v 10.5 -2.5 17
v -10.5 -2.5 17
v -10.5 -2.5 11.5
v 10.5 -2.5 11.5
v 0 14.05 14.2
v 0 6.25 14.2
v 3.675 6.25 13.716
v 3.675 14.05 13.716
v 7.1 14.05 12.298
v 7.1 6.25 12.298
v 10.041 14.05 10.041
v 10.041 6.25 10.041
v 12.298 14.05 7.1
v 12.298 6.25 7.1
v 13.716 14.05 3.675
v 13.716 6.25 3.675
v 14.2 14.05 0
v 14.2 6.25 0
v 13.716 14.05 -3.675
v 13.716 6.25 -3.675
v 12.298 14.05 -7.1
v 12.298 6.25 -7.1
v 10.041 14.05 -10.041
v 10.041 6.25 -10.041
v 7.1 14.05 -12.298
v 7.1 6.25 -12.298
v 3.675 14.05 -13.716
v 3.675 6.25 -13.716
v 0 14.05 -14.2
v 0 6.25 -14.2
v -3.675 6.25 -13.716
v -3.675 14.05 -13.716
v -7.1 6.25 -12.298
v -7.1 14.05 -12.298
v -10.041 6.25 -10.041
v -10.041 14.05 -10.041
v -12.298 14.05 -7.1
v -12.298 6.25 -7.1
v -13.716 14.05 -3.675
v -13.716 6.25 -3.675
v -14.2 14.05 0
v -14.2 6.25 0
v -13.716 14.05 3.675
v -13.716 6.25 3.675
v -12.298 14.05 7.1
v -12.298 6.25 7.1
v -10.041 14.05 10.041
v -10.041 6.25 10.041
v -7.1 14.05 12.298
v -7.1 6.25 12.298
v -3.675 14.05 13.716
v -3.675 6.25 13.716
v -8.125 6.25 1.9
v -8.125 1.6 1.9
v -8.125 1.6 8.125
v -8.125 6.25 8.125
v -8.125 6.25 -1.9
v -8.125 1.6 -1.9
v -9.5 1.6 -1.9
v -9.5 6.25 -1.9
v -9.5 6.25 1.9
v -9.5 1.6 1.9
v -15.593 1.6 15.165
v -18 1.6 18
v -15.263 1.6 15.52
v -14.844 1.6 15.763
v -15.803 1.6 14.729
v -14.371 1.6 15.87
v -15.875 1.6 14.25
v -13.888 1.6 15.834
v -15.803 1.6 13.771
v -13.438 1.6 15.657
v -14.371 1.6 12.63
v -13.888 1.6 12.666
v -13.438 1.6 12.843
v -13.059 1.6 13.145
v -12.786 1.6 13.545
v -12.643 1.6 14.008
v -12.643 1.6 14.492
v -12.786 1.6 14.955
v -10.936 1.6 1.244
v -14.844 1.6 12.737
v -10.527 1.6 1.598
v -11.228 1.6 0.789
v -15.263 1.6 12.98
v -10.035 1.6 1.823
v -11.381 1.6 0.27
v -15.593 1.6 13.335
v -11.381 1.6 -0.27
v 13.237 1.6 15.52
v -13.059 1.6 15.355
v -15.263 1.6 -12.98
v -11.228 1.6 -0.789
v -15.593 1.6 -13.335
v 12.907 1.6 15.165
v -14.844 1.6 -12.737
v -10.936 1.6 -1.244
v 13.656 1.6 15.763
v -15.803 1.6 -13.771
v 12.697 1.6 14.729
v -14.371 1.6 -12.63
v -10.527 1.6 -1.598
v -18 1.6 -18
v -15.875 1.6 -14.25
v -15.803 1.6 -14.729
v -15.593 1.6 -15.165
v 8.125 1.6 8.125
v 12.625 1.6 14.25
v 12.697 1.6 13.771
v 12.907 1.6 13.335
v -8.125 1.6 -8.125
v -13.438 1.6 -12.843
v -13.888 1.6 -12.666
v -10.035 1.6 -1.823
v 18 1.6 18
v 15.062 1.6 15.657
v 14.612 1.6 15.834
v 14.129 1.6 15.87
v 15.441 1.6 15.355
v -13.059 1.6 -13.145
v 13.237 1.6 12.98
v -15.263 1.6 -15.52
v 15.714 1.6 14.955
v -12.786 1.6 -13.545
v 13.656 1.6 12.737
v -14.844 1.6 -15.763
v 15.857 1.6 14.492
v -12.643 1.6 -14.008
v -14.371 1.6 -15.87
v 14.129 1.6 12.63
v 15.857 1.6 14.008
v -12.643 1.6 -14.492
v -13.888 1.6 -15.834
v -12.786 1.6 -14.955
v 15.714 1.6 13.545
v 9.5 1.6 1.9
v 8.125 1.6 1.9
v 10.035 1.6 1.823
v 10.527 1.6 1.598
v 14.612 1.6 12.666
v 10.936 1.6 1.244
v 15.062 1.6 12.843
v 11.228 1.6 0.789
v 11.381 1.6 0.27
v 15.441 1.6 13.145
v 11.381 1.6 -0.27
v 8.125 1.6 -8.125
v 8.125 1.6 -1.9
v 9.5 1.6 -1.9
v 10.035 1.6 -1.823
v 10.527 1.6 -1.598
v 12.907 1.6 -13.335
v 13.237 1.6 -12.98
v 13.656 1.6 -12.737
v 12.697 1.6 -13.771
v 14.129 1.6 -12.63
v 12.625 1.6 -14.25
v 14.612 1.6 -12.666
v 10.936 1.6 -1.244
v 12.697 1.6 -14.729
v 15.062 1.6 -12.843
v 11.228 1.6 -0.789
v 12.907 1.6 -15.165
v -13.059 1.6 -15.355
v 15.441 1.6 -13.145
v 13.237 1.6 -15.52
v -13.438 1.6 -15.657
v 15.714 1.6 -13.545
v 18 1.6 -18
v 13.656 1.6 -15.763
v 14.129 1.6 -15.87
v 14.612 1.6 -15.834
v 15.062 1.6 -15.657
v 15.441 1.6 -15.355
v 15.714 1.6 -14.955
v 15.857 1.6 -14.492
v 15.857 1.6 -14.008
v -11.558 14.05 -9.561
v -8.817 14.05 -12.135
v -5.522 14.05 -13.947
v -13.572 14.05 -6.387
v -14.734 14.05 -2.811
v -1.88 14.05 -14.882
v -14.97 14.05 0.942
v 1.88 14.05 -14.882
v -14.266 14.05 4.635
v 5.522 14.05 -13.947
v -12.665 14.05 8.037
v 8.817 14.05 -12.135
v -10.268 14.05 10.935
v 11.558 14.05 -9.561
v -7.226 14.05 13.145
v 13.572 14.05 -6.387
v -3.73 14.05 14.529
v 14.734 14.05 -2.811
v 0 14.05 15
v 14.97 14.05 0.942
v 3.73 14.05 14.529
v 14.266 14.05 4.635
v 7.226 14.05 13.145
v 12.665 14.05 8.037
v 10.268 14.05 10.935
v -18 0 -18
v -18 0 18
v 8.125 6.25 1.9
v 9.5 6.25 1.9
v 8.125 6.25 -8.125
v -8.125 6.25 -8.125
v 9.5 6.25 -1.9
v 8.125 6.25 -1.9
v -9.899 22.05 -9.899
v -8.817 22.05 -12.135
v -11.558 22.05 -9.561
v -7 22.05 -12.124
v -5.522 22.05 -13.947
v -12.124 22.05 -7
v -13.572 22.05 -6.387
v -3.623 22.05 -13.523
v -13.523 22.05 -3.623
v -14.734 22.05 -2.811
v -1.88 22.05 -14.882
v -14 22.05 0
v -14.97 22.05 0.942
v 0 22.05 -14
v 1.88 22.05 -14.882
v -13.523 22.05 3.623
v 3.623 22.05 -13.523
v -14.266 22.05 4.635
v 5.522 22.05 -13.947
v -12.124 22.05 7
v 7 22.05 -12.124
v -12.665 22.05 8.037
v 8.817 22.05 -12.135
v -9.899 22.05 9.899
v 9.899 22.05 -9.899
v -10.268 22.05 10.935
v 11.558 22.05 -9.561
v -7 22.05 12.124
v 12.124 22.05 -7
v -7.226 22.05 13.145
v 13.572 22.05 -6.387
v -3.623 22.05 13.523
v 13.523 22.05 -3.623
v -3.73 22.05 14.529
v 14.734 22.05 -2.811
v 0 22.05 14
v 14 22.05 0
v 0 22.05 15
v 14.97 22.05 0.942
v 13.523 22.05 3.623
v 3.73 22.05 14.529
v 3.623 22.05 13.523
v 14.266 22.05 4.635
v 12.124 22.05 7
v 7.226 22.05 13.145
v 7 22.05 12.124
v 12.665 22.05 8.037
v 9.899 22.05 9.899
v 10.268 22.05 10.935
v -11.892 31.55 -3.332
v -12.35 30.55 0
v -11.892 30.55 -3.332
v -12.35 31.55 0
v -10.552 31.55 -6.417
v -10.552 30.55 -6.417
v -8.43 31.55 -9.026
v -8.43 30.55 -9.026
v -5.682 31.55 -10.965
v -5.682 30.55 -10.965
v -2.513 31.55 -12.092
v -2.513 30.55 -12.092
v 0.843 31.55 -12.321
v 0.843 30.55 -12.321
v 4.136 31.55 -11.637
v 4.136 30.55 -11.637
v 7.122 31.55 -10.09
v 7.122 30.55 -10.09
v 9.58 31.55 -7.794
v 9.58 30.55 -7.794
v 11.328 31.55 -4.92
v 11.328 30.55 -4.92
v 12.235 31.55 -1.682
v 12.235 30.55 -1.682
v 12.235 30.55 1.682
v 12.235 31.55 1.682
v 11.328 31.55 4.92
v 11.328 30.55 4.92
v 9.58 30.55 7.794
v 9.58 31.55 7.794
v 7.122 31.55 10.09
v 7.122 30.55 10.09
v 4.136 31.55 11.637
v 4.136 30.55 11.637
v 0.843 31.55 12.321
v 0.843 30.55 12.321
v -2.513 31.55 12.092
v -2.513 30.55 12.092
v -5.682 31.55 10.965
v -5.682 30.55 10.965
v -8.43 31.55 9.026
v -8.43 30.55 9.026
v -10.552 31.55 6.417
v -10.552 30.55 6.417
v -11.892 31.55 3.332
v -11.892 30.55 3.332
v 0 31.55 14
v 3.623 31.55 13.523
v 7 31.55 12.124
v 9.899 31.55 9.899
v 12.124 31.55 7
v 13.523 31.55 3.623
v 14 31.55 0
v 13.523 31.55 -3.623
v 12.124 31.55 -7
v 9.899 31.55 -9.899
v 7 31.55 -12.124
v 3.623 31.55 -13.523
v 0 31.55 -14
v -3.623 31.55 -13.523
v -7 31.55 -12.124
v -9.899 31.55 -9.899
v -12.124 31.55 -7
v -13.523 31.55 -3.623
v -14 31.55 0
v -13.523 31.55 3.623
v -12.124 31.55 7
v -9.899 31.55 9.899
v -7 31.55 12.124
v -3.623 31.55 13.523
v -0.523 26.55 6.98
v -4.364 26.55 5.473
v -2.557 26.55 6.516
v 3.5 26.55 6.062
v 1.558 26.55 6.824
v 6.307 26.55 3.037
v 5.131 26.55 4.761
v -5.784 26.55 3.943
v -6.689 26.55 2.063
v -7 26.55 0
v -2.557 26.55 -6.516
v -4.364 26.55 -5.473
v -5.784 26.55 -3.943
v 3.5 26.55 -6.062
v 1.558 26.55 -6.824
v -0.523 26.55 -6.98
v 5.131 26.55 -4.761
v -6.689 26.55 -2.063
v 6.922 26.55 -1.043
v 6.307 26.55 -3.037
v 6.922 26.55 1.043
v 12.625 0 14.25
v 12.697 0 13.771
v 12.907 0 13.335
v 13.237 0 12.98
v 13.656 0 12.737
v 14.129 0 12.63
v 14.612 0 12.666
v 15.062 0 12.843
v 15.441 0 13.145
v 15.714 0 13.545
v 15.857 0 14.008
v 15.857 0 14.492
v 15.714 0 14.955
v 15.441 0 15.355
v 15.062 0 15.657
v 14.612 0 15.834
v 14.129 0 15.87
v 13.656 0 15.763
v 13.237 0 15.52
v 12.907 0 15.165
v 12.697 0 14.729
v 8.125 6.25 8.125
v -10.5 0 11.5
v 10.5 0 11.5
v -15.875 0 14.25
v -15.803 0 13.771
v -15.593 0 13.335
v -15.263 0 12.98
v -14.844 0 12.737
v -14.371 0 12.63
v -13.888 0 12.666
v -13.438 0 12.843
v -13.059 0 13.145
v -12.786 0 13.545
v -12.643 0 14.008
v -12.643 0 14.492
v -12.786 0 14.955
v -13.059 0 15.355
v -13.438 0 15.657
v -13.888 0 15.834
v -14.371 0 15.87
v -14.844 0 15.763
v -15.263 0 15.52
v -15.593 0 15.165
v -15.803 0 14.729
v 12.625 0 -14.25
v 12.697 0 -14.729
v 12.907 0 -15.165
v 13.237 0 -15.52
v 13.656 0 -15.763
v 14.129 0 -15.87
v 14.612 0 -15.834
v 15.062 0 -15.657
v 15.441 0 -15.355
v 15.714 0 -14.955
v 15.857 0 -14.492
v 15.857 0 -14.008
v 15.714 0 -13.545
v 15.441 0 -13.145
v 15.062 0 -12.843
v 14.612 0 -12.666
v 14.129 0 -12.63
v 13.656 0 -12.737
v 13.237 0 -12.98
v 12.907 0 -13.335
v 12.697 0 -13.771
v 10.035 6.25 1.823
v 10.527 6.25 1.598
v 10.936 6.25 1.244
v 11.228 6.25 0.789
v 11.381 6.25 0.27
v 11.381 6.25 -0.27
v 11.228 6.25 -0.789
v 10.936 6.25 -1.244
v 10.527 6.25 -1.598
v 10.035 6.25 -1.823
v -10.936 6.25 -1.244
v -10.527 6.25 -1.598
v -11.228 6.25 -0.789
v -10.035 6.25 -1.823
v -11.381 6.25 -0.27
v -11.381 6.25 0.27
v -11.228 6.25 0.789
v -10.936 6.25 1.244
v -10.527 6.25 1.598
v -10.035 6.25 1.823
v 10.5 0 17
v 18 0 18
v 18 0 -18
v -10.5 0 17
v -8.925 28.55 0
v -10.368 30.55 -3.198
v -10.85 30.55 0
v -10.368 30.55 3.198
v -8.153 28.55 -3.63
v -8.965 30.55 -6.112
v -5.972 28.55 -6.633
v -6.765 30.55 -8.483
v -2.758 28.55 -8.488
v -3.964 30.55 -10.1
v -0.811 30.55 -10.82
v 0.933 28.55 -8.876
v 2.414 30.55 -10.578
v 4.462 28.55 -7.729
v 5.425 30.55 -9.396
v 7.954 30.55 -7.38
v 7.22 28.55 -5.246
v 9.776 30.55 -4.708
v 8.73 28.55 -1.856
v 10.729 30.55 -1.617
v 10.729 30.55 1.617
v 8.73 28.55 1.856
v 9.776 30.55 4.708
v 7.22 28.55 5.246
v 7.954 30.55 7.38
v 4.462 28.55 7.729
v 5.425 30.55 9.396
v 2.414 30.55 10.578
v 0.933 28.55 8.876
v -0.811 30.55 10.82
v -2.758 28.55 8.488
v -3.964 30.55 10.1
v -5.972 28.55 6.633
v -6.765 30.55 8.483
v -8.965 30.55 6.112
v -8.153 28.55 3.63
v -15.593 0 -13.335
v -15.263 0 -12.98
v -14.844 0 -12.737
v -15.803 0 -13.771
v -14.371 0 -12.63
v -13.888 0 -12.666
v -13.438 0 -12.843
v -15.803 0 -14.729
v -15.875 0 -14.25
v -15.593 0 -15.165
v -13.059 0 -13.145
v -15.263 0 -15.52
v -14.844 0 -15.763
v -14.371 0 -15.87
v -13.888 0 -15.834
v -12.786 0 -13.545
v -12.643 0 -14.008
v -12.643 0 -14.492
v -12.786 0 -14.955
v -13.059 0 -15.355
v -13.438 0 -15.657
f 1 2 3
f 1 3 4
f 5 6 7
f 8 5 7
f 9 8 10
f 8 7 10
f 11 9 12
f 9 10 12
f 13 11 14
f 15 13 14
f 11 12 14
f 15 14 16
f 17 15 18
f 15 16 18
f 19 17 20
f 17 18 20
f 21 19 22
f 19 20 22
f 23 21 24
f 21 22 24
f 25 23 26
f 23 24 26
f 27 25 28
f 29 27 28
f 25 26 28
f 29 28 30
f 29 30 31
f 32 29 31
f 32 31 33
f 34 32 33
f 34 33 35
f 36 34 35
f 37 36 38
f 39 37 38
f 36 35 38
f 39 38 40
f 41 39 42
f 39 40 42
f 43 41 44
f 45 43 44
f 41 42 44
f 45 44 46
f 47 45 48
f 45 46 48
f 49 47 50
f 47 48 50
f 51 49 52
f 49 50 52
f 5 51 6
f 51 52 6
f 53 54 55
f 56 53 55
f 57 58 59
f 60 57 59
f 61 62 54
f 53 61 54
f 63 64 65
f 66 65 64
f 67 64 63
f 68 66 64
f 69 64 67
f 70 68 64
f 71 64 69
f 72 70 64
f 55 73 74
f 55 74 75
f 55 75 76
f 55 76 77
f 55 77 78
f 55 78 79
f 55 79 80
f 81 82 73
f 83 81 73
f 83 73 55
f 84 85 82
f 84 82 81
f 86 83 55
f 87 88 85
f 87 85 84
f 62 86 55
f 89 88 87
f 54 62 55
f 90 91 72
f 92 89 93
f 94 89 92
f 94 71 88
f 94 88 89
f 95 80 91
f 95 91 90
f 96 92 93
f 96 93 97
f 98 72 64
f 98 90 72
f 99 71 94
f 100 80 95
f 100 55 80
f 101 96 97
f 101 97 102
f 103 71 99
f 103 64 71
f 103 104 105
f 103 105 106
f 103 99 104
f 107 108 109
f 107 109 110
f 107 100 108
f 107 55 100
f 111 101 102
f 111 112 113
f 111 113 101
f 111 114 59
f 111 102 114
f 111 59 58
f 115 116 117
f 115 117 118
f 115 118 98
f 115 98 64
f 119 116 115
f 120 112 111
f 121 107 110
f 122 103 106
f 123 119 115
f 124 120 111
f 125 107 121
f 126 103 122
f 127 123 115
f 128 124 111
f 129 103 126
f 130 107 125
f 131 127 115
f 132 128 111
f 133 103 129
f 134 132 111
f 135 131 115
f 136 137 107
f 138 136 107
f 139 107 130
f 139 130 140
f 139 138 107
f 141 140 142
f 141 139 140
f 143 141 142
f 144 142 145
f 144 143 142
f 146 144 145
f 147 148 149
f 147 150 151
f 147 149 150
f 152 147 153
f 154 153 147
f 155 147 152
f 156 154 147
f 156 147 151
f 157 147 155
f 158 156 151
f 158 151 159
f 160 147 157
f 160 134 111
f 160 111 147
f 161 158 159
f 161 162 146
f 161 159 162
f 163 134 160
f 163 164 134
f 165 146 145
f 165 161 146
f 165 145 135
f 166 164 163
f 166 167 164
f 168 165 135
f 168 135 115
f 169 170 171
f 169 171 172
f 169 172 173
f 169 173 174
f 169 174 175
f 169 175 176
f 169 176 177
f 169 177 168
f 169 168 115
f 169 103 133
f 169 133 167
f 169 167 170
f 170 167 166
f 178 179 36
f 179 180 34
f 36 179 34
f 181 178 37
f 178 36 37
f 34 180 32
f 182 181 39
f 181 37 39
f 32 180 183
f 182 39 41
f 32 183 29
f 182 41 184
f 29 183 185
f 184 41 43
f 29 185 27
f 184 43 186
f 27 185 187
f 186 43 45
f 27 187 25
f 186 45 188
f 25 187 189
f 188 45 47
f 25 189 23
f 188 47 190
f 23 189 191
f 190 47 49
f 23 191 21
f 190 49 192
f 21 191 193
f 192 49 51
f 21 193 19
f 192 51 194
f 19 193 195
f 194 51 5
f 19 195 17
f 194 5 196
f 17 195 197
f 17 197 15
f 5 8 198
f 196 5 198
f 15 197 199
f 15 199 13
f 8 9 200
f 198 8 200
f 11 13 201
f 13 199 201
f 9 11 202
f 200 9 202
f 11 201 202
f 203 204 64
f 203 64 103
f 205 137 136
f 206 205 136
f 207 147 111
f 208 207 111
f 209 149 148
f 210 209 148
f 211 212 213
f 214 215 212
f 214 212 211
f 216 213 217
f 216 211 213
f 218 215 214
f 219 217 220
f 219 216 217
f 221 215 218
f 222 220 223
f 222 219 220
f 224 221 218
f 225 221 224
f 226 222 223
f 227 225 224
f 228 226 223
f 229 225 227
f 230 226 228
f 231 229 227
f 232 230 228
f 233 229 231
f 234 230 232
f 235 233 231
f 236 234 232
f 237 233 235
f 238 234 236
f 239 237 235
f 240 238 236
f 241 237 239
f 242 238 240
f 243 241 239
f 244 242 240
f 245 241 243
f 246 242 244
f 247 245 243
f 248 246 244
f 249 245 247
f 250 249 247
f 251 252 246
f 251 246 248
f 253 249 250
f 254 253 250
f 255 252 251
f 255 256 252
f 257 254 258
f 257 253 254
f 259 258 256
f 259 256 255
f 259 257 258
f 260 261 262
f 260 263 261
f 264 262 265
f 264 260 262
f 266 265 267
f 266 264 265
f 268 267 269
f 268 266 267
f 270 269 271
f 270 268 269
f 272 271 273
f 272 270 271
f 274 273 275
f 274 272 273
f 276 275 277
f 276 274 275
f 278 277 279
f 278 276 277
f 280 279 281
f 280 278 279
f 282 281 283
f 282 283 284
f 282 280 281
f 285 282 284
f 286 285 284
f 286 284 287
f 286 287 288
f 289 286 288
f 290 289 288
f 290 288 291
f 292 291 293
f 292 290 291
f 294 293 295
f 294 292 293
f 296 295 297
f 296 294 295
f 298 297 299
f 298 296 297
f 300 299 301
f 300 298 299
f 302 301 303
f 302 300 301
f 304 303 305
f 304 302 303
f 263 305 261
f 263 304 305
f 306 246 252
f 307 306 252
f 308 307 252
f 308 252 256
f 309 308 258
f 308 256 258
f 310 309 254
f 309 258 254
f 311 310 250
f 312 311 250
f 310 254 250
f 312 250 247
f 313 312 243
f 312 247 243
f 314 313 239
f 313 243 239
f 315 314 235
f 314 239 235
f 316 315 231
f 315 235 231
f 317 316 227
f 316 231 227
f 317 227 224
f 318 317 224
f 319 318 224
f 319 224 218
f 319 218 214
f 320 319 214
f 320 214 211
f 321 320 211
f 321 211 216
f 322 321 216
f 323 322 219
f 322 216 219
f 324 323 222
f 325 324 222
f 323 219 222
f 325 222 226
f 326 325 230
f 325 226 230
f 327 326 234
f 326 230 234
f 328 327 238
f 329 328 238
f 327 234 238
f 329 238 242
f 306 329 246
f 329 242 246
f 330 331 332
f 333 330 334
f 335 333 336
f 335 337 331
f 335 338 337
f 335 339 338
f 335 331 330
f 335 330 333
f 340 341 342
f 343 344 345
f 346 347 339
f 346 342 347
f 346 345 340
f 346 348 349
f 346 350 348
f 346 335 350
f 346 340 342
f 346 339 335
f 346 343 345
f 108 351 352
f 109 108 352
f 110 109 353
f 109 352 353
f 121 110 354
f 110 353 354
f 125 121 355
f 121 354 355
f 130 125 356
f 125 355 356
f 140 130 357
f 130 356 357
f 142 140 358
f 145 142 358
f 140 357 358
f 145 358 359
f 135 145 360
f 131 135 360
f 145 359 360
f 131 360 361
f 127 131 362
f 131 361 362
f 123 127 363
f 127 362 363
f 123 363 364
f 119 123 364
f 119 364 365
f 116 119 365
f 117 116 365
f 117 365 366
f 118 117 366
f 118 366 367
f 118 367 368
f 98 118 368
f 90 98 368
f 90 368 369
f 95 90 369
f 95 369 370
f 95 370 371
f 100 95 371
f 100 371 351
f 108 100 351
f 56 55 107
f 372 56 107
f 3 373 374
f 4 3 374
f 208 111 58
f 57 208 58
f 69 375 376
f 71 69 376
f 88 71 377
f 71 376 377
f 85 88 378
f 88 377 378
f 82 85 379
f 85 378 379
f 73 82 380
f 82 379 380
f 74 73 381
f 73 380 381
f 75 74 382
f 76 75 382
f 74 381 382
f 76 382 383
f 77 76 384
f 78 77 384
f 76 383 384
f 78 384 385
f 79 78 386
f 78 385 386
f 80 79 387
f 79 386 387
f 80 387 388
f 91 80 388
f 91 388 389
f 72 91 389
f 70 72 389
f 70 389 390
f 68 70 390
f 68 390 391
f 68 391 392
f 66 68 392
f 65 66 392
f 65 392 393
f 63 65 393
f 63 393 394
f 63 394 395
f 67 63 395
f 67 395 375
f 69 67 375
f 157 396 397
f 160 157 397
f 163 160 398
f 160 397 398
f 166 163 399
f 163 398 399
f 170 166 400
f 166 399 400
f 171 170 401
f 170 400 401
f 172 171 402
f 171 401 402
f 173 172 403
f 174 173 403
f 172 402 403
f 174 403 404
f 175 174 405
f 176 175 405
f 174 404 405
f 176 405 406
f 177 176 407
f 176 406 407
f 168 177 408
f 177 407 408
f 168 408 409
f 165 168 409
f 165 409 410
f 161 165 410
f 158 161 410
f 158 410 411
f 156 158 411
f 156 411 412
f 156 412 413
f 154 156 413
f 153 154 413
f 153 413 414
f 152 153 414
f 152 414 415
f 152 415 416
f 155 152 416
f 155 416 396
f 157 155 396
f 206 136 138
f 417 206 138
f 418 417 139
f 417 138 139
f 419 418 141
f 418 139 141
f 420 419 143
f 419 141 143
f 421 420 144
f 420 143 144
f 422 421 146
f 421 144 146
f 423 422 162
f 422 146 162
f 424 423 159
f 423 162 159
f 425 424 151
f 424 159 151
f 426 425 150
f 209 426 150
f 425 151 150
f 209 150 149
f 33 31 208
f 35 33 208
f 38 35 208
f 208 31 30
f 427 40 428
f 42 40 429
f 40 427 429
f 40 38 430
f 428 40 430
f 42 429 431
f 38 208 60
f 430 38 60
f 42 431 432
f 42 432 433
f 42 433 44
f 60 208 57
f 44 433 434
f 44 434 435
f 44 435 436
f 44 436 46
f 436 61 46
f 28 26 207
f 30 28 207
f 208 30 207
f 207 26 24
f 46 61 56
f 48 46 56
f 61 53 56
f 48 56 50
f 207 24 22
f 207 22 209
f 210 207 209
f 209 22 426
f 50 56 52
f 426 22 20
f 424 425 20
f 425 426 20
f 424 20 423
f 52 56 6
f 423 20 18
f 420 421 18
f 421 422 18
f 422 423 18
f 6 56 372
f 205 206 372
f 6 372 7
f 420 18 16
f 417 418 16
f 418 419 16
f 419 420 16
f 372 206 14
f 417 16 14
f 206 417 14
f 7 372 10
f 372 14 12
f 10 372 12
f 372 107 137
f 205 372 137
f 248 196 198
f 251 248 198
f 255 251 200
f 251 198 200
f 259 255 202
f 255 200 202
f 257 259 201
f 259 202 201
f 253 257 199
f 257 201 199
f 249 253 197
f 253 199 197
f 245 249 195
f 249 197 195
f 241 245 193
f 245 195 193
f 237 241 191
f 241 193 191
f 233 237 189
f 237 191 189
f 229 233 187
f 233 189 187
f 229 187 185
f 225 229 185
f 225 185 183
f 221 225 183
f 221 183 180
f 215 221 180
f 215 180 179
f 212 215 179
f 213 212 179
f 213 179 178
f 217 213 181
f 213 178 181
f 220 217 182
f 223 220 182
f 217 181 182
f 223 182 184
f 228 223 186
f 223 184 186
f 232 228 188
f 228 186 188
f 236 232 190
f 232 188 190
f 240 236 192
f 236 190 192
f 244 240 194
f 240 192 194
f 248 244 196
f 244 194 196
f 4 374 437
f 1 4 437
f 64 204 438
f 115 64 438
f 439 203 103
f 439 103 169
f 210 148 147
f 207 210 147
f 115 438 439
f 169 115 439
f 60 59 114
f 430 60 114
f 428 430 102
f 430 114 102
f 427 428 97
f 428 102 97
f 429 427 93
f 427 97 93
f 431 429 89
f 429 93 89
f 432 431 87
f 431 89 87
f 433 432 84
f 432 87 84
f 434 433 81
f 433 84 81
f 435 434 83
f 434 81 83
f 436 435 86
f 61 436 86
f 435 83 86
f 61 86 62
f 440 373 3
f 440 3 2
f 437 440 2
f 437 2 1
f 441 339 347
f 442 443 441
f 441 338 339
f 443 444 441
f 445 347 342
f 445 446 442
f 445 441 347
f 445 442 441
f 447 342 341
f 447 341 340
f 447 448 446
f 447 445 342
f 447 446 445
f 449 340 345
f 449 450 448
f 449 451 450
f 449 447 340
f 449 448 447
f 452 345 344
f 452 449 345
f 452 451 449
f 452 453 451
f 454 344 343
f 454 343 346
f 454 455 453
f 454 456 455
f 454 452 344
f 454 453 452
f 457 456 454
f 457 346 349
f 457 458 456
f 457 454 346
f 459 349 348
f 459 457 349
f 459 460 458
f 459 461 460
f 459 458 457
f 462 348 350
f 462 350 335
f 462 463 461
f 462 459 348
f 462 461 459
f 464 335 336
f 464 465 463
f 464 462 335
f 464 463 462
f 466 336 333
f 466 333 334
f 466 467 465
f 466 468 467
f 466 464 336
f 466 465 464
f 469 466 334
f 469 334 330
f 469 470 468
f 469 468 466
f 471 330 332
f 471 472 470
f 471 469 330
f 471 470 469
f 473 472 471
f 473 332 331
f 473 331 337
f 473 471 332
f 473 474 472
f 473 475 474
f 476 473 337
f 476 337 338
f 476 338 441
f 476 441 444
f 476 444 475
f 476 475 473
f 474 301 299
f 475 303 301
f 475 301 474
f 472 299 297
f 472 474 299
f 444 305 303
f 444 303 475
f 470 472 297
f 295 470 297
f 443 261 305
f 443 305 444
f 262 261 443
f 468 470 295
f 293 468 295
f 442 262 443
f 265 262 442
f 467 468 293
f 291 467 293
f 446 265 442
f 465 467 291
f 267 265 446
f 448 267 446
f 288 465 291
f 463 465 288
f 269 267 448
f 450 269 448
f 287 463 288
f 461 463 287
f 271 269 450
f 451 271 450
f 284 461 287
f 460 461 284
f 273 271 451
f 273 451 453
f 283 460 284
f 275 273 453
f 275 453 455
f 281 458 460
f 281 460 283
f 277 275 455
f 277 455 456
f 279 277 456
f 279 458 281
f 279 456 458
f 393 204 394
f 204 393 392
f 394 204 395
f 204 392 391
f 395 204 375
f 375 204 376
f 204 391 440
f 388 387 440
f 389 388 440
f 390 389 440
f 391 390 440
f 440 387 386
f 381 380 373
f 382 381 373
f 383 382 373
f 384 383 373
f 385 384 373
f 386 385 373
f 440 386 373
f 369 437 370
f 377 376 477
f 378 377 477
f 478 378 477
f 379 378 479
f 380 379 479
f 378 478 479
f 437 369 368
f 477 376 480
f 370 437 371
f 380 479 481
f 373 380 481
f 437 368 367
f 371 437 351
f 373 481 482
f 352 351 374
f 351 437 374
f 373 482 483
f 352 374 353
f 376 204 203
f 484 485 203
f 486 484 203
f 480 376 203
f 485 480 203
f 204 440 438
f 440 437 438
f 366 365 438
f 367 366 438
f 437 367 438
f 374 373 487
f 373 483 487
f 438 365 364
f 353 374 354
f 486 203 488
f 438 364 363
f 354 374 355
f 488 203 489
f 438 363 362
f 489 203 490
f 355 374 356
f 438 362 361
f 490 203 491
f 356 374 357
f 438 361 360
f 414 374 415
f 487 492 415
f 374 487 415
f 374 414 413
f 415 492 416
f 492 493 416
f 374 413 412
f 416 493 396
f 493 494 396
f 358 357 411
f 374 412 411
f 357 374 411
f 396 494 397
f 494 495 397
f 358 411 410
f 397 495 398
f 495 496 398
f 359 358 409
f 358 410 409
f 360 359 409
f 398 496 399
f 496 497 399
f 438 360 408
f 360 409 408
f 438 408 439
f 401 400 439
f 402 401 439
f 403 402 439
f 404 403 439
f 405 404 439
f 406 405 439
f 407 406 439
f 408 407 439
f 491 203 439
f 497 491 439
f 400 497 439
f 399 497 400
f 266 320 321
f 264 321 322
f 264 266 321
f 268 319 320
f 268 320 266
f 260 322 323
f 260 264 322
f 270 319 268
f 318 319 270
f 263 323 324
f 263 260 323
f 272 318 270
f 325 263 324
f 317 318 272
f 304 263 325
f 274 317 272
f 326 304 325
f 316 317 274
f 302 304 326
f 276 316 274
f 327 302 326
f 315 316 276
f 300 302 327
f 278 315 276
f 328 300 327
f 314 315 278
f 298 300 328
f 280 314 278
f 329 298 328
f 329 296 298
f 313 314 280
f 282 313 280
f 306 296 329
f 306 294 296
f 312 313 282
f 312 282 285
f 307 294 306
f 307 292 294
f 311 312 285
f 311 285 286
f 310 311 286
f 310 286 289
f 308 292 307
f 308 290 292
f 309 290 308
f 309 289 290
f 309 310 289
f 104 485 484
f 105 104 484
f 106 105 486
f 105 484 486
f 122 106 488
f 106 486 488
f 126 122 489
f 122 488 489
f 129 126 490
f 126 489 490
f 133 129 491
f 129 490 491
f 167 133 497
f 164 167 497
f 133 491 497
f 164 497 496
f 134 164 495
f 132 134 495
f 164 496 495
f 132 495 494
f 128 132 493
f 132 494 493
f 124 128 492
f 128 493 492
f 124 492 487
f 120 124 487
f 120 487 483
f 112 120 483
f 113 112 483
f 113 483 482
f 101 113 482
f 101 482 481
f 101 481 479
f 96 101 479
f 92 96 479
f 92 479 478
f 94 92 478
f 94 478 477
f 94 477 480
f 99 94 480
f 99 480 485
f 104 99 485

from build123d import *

# Parameters (mm, degrees)
SKETCH1_W                  = 36
SKETCH1_H                  = 36
BOSS_EXTRUDE1_DEPTH        = 1.6
F_3_2_3_2_DIAMETER_HOLE1_D = 3.25
BOSS_EXTRUDE2_DEPTH        = 4.65
SKETCH5_R                  = 14.2
BOSS_EXTRUDE3_DEPTH        = 7.8
SKETCH6_R                  = 15
BOSS_EXTRUDE4_DEPTH        = 8
SKETCH7_R                  = 14
BOSS_EXTRUDE5_DEPTH        = 9.5
SKETCH8_W                  = 21
SKETCH8_H                  = 5.5
BOSS_EXTRUDE6_DEPTH        = 2.5


with BuildPart() as part:
    # Sketch1 → Boss-Extrude1 (new body)
    with BuildSketch(Plane(origin=(0, 0, 0), x_dir=(1, 0, 0), z_dir=(0, 1, 0))):
        Rectangle(SKETCH1_W, SKETCH1_H)
    extrude(amount=BOSS_EXTRUDE1_DEPTH)

    # Ø3.2 (3.2) Diameter Hole1 (through all)
    with Locations(Plane(origin=(0, 1.6, 0), x_dir=(1, 0, 0), z_dir=(0, 1, 0))):
        with Locations((-14.25, 14.25), (14.25, 14.25), (14.25, -14.25), (-14.25, -14.25)):
            Hole(F_3_2_3_2_DIAMETER_HOLE1_D / 2)

    # Sketch4 → Boss-Extrude2 (add)
    with BuildSketch(Plane(origin=(0, 1.6, 0), x_dir=(1, 0, 0), z_dir=(0, 1, 0))):
        with BuildLine():
            Line((-8.125, -8.125), (8.125, -8.125))
            Line((8.125, -8.125), (8.125, -1.9))
            Line((8.125, -1.9), (9.5, -1.9))
            ThreePointArc((9.5, -1.9), (11.4, 0), (9.5, 1.9))
            Line((9.5, 1.9), (8.125, 1.9))
            Line((8.125, 1.9), (8.125, 8.125))
            Line((8.125, 8.125), (-8.125, 8.125))
            Line((-8.125, 8.125), (-8.125, 1.9))
            Line((-8.125, 1.9), (-9.5, 1.9))
            ThreePointArc((-9.5, 1.9), (-11.4, 0), (-9.5, -1.9))
            Line((-9.5, -1.9), (-8.125, -1.9))
            Line((-8.125, -1.9), (-8.125, -8.125))
        make_face()
    extrude(amount=BOSS_EXTRUDE2_DEPTH)

    # Sketch5 → Boss-Extrude3 (add)
    with BuildSketch(Plane(origin=(0, 6.25, 0), x_dir=(1, 0, 0), z_dir=(0, 1, 0))):
        with Locations(Location((0, 0, 0), (0, 0, 270))):
            Circle(SKETCH5_R)
    extrude(amount=BOSS_EXTRUDE3_DEPTH)

    # Sketch6 → Boss-Extrude4 (add)
    with BuildSketch(Plane(origin=(0, 14.05, 0), x_dir=(1, 0, 0), z_dir=(0, 1, 0))):
        with Locations(Location((0, 0, 0), (0, 0, 270))):
            Circle(SKETCH6_R)
    extrude(amount=BOSS_EXTRUDE4_DEPTH)

    # Sketch7 → Boss-Extrude5 (add)
    with BuildSketch(Plane(origin=(0, 22.05, 0), x_dir=(1, 0, 0), z_dir=(0, 1, 0))):
        with Locations(Location((0, 0, 0), (0, 0, 270))):
            Circle(SKETCH7_R)
    extrude(amount=BOSS_EXTRUDE5_DEPTH)

    # Sketch8 → Boss-Extrude6 (add)
    with BuildSketch(Plane.XZ):
        with Locations((0, 14.25)):
            Rectangle(SKETCH8_W, SKETCH8_H)
    extrude(amount=BOSS_EXTRUDE6_DEPTH)

    # Sketch9 → Cut-Revolve1 (revolve, cut)
    with BuildSketch(Plane.XY, mode=Mode.PRIVATE) as cut_revolve1_sk:
        Polygon((0, 31.55), (0, 26.55), (7, 26.55), (10.85, 30.55), (12.35, 30.55), (12.35, 31.55), align=None)
    revolve(cut_revolve1_sk.sketch.rotate(Axis((0, 31.55, 0), (0, -1, 0)), 180), axis=Axis((0, 31.55, 0), (0, -1, 0)), mode=Mode.SUBTRACT)


solid = part.part
